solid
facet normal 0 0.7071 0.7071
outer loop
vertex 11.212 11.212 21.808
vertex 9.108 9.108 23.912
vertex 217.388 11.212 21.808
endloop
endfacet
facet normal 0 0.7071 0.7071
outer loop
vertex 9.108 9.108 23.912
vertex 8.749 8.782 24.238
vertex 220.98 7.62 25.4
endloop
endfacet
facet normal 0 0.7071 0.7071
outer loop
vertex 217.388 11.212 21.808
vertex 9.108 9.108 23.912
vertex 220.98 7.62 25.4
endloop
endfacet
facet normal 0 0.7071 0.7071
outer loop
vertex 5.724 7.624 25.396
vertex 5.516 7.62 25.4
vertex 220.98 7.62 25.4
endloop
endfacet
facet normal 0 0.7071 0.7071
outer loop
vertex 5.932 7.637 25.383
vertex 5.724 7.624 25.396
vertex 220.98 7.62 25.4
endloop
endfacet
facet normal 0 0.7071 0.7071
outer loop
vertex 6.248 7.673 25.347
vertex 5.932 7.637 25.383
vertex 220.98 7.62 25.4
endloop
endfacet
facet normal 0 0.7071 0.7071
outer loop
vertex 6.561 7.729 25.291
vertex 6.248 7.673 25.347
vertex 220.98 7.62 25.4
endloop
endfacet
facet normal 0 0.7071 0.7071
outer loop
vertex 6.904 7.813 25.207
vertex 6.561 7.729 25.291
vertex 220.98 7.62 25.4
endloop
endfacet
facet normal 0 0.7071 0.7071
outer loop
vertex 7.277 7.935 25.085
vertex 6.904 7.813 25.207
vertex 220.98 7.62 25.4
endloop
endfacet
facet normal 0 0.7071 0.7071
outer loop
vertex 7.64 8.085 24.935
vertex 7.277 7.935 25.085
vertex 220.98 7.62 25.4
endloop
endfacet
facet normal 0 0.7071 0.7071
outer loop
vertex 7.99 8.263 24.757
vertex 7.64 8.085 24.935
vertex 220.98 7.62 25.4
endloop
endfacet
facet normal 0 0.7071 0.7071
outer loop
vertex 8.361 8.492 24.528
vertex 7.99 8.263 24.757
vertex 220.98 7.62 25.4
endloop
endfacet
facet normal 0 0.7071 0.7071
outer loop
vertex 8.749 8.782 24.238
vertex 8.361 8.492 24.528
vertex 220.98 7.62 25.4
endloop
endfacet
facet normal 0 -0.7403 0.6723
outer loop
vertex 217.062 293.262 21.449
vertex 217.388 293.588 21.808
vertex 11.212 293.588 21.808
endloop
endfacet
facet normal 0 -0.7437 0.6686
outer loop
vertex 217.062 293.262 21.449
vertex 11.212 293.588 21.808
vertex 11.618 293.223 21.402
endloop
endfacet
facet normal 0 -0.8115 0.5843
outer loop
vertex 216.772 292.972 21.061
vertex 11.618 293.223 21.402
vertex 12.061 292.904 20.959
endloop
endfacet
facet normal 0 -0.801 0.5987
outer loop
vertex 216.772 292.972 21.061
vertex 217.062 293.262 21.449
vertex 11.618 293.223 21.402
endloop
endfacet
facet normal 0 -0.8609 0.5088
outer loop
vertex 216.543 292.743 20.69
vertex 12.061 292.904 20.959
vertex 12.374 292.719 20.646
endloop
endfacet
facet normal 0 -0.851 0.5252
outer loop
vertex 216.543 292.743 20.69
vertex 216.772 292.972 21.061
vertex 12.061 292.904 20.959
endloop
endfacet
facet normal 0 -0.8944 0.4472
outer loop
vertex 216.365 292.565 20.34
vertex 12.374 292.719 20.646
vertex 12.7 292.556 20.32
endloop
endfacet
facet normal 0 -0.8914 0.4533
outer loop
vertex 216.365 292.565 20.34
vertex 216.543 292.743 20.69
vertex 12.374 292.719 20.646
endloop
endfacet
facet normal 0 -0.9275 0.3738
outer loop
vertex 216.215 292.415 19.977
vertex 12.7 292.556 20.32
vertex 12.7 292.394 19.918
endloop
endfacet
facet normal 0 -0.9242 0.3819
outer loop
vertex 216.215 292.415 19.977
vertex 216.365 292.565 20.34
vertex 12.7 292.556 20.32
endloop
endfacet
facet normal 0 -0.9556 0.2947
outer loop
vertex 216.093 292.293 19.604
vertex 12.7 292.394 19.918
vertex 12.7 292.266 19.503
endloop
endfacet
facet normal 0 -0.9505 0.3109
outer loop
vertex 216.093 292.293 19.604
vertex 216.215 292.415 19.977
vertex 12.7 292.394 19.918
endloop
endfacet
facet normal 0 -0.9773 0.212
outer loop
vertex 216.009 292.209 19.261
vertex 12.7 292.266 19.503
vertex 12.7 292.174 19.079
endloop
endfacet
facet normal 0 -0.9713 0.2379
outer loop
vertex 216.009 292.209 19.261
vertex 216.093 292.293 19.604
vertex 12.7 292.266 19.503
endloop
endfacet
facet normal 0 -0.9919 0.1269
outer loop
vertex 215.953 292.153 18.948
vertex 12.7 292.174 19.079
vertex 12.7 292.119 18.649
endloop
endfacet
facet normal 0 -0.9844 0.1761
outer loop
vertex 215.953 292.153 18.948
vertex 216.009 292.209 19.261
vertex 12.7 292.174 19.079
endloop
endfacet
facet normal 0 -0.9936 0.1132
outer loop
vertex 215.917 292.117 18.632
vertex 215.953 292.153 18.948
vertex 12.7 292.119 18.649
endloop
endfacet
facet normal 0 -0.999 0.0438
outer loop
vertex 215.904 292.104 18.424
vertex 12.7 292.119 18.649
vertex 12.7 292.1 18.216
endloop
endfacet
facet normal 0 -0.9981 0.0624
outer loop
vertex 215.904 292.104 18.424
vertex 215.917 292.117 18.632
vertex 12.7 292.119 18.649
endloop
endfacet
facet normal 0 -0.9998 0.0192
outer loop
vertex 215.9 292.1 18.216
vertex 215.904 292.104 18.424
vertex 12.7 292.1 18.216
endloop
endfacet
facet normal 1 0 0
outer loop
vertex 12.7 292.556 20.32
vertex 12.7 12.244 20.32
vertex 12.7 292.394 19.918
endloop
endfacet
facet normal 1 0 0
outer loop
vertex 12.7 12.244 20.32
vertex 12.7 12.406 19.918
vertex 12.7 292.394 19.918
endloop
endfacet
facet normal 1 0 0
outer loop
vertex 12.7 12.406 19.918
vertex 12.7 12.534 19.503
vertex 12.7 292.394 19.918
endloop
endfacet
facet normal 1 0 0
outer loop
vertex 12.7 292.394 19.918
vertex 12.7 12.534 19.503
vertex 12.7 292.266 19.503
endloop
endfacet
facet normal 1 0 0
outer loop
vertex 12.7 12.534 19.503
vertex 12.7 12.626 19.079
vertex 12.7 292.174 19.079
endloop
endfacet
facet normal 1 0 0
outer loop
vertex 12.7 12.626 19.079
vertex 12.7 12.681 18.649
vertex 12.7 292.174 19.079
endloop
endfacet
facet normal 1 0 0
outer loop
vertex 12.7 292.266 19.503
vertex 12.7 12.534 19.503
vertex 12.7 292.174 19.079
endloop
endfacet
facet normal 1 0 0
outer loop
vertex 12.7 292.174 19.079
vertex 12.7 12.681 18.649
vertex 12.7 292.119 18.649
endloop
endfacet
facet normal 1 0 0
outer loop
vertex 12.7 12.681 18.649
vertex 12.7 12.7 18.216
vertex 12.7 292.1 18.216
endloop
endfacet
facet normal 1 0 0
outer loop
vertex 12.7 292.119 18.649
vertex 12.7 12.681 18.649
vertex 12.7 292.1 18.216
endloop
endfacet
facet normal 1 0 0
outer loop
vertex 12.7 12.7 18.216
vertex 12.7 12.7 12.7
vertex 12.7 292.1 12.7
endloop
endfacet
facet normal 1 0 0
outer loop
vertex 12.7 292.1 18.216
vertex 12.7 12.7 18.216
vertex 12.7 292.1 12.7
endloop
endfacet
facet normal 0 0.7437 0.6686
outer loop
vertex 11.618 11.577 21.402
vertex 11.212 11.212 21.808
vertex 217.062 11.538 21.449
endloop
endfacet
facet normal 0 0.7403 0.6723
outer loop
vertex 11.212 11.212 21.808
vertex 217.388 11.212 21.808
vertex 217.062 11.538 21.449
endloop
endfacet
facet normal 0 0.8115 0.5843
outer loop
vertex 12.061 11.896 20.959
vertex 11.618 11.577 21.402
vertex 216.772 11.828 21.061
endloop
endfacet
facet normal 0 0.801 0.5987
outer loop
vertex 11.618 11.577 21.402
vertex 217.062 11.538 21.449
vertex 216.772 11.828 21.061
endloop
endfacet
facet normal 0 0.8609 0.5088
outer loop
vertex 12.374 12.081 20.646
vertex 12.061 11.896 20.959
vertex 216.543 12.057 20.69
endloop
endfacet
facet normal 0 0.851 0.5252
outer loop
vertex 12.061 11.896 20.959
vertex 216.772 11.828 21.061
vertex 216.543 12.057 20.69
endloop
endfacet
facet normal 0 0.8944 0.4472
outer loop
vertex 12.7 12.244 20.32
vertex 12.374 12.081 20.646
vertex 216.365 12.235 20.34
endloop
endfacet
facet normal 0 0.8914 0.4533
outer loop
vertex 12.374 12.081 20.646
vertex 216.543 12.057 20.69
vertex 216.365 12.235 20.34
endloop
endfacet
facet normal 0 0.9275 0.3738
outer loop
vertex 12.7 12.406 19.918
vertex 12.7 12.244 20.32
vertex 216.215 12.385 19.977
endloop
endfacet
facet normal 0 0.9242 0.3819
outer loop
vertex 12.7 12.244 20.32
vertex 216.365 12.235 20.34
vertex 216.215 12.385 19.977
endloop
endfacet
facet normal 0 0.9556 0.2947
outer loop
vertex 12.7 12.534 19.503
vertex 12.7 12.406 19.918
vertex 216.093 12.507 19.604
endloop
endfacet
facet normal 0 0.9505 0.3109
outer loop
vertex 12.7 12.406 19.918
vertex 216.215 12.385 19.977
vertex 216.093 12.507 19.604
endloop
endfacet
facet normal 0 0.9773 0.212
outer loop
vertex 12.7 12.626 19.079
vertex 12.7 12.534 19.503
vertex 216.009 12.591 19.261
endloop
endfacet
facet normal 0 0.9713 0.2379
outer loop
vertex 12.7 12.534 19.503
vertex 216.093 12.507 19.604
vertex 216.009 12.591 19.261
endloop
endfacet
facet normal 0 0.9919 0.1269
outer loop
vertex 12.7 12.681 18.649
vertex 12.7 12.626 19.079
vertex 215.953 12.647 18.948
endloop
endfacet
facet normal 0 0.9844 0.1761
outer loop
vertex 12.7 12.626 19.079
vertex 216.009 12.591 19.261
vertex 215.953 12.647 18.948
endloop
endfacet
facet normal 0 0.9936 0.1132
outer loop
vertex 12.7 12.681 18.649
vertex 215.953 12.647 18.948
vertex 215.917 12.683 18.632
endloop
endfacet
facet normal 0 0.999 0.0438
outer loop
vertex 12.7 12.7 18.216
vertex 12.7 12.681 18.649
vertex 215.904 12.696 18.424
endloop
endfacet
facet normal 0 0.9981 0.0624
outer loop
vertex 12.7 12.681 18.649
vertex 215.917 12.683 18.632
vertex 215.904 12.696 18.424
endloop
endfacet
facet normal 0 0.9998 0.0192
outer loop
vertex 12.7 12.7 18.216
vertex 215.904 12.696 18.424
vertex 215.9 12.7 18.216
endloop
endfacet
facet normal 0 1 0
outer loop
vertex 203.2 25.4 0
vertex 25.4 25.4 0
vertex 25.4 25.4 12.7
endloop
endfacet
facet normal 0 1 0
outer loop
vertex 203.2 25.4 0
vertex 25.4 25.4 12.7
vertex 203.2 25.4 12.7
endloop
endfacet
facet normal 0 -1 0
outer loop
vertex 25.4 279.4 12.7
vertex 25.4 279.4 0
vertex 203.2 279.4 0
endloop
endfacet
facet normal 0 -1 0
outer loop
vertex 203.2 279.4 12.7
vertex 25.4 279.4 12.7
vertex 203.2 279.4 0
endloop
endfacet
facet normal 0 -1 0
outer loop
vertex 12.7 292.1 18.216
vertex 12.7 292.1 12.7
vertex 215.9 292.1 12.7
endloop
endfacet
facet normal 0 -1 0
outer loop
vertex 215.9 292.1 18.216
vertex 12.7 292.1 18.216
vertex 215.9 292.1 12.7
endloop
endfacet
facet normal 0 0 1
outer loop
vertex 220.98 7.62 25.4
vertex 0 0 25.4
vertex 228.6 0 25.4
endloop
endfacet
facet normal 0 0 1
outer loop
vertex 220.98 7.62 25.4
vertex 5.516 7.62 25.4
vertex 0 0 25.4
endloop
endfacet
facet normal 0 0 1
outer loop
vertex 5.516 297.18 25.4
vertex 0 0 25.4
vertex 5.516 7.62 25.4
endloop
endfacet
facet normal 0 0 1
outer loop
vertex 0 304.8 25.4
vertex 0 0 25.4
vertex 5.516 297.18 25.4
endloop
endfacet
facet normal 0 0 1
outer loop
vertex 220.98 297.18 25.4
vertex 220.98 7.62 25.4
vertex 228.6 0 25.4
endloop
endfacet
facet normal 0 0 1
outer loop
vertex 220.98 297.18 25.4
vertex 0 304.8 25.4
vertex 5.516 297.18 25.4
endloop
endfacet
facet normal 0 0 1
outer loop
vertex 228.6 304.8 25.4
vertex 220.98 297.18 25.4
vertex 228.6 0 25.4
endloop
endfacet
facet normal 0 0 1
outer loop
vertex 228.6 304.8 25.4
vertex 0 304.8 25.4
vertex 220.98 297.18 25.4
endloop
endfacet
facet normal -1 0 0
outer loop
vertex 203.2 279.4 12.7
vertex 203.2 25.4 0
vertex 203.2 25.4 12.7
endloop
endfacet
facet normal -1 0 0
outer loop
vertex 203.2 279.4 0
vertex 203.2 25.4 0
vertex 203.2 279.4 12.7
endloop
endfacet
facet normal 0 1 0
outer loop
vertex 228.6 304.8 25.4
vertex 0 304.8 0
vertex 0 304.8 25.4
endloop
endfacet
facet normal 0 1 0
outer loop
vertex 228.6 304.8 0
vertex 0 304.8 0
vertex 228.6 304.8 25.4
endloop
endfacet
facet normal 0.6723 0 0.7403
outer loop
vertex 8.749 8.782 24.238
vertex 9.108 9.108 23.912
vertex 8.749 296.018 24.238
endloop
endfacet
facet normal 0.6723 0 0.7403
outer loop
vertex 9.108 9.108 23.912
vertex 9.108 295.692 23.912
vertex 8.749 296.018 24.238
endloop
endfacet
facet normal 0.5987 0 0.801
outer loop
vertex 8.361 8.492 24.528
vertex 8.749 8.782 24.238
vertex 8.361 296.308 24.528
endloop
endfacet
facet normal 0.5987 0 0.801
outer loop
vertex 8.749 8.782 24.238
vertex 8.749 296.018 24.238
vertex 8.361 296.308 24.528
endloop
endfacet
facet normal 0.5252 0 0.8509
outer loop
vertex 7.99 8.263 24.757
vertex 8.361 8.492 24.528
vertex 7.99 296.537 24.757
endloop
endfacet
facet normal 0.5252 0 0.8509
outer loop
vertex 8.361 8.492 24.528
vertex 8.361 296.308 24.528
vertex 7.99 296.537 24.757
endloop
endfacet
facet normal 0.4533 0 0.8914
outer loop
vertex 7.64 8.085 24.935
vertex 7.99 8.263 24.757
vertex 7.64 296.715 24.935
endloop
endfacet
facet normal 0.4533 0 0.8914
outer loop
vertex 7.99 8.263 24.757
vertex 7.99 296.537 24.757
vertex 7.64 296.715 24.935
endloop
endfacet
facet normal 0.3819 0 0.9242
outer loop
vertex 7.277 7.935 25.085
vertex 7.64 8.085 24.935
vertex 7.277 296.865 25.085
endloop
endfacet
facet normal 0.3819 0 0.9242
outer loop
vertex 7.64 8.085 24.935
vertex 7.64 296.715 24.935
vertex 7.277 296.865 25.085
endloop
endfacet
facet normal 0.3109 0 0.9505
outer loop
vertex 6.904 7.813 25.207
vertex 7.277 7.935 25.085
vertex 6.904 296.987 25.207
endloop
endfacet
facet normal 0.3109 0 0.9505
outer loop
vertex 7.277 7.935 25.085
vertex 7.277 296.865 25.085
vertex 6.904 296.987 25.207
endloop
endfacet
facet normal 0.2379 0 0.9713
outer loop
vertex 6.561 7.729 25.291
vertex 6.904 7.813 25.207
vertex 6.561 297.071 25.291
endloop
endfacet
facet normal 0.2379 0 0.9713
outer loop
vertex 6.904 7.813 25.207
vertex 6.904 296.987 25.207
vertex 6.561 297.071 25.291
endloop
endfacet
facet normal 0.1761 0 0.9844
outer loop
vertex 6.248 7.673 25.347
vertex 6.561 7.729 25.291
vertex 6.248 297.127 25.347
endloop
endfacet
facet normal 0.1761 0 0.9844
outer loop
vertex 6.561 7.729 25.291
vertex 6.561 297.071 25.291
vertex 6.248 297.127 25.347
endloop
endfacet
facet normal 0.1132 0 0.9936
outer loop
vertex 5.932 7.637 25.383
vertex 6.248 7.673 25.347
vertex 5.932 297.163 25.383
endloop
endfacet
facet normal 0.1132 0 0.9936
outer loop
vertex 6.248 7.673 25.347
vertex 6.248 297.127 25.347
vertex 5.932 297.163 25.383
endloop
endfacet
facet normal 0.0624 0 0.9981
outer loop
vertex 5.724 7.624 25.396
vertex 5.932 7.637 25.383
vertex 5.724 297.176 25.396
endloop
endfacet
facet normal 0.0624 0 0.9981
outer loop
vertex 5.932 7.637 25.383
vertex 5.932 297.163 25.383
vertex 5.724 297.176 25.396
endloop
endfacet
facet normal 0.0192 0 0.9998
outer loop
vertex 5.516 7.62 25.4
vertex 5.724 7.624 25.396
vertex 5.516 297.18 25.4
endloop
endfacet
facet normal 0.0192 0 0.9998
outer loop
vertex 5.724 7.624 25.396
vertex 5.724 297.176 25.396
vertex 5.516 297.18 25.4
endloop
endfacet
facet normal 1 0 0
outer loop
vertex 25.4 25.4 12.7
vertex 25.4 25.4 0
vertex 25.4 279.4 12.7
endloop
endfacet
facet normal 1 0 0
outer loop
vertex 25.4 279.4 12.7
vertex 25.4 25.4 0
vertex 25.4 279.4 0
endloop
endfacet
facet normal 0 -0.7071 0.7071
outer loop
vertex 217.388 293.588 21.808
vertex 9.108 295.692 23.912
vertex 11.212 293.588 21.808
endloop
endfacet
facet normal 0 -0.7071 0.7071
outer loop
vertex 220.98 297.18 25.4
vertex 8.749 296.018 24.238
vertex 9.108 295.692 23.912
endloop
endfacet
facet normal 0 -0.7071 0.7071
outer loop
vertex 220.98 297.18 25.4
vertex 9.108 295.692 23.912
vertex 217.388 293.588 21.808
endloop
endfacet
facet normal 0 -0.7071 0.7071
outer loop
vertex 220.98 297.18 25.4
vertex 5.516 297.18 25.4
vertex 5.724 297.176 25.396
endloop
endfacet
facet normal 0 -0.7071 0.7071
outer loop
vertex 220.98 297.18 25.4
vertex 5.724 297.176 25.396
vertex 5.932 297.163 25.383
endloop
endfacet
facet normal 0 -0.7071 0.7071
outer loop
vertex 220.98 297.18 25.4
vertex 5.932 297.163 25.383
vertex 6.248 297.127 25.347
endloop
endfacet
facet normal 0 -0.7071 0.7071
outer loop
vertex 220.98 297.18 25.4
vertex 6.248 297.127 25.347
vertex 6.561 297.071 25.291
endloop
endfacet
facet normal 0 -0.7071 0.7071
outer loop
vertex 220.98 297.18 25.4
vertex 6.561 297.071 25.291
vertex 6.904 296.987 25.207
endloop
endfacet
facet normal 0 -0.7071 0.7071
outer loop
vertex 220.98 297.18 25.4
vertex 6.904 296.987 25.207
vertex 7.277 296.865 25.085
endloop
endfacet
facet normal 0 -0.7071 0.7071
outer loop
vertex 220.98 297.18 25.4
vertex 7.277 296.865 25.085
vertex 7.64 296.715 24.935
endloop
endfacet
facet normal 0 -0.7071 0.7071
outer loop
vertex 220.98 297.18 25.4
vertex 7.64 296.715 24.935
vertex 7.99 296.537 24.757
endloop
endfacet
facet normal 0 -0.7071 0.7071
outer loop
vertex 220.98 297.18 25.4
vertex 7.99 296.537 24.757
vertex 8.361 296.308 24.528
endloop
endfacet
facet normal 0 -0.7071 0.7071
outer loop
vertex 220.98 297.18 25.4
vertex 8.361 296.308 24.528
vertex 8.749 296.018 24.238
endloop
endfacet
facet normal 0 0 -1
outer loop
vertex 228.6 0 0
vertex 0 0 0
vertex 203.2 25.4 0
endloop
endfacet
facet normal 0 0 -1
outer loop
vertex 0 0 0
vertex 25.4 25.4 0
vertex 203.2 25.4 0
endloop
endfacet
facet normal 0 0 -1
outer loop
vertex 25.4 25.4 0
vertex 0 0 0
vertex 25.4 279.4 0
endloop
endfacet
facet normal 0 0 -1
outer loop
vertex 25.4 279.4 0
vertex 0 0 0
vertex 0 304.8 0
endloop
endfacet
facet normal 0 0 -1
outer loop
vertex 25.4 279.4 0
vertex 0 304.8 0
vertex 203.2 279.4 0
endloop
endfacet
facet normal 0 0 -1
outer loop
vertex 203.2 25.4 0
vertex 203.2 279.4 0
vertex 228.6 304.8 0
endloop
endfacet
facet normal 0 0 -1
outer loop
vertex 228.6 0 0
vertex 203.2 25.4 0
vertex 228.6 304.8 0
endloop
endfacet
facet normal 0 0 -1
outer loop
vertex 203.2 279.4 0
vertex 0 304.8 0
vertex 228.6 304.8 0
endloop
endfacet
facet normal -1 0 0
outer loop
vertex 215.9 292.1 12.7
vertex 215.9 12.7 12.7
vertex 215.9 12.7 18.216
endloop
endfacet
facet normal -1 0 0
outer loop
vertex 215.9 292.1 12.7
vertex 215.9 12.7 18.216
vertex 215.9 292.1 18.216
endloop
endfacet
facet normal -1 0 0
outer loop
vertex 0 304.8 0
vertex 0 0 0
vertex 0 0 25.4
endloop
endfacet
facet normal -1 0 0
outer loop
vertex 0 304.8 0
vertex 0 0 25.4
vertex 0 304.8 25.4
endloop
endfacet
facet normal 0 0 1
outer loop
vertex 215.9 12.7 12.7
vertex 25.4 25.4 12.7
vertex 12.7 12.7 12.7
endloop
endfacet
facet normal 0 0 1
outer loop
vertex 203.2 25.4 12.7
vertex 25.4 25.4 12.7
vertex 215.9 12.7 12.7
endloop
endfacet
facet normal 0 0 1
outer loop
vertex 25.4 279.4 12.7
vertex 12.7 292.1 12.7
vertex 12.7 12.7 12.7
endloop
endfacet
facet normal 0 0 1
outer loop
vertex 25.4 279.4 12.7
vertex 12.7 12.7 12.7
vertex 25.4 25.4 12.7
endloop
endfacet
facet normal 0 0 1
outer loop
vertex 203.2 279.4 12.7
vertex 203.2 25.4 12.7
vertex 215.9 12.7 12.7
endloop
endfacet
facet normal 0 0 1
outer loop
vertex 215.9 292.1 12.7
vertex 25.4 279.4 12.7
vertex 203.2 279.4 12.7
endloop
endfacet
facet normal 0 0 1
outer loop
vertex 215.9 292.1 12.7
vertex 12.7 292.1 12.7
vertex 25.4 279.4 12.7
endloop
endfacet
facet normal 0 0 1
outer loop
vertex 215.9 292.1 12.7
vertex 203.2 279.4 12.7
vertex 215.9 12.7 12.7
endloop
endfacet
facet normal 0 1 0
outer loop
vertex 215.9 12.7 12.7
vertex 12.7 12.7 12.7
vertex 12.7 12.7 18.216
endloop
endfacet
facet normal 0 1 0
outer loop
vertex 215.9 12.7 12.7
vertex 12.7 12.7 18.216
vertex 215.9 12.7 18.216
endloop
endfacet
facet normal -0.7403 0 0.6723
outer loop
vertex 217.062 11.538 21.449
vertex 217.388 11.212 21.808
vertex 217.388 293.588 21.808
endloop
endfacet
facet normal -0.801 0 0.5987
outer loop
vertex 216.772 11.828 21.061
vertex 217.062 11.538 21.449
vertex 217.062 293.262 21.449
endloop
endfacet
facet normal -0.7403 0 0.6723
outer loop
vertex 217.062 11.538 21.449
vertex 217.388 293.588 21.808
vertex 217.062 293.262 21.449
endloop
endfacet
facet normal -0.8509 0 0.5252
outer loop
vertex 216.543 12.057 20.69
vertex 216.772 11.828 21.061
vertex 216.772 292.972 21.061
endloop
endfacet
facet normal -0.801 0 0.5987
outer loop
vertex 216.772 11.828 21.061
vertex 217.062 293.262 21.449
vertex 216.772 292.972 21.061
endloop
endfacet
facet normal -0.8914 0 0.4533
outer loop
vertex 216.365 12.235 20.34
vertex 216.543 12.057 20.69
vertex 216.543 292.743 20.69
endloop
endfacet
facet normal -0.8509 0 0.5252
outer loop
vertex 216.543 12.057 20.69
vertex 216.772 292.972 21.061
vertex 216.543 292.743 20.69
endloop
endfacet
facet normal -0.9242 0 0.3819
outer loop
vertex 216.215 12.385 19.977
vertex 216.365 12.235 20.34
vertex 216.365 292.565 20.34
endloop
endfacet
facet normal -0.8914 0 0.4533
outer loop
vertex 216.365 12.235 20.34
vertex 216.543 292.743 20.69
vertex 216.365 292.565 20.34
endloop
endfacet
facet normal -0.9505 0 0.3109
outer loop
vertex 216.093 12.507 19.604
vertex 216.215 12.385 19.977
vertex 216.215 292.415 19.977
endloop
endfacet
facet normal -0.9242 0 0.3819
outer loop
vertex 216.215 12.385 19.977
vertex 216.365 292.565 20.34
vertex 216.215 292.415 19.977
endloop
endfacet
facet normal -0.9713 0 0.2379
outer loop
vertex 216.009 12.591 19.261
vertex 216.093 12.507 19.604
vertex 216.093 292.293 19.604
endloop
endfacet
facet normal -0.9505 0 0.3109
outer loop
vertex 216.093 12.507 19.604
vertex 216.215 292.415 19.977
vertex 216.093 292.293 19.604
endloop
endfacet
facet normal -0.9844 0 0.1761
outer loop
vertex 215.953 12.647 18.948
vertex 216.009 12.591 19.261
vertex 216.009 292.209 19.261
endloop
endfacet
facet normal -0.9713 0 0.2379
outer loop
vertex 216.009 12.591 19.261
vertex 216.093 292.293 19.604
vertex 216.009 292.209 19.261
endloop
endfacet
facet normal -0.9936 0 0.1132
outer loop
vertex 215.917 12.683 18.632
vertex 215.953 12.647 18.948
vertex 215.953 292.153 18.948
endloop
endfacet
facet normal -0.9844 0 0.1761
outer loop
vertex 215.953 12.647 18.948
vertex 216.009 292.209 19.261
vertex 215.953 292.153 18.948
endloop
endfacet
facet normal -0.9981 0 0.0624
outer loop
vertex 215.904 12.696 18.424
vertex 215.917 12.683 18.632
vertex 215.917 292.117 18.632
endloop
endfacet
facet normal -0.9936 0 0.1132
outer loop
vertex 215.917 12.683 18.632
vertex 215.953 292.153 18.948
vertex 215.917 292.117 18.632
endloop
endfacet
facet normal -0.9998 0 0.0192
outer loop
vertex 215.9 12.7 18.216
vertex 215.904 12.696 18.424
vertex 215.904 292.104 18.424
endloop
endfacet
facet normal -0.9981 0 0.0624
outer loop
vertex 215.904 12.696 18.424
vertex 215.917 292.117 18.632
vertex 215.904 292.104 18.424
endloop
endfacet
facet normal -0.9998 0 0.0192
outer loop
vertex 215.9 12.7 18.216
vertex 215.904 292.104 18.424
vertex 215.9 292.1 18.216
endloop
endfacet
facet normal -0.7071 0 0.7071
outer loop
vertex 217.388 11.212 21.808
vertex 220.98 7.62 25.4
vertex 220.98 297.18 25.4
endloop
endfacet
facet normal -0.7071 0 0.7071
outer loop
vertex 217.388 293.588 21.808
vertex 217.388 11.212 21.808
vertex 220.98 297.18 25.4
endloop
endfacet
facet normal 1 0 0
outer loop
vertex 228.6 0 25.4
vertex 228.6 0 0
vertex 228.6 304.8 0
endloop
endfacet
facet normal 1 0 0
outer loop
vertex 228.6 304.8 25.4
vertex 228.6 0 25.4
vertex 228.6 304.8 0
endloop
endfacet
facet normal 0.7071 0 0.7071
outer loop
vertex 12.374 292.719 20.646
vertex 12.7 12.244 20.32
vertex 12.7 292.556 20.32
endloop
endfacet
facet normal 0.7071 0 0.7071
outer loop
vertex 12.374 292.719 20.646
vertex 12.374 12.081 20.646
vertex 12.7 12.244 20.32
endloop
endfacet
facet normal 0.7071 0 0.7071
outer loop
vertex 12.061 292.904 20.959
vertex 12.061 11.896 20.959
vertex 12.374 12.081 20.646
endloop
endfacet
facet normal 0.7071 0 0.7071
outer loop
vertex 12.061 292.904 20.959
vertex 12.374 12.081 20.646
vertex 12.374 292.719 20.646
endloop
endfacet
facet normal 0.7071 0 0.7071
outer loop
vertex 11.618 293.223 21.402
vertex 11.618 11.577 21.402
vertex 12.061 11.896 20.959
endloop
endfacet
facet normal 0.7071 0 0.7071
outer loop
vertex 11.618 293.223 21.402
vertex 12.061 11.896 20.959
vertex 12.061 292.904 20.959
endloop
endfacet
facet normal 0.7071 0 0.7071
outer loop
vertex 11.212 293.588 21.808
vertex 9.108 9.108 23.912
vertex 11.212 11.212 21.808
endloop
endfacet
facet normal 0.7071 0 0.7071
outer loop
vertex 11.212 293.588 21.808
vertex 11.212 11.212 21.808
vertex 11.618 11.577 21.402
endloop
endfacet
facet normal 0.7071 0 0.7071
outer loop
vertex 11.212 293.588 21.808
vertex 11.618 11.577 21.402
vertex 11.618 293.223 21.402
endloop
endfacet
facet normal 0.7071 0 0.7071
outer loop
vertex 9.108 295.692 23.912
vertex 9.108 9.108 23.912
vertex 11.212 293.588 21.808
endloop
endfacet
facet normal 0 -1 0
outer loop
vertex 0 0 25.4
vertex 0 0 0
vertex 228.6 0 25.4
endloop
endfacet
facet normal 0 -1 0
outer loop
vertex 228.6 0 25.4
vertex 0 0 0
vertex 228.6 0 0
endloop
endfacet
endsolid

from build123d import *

# Parameters (mm, degrees)
F0_W     = 228.6
F0_H     = 304.8
F0_W_2   = 203.2
F0_H_2   = 279.4
F1_DEPTH = 25.4
F0_W_3   = 177.8
F0_H_3   = 254
F2_DEPTH = 12.7
F3_SIZE  = 5.08
F4_F1_R  = 5.08
F4_F2_R  = 5.08
F4_F3_R  = 5.08
F4_F4_R  = 5.08


with BuildPart() as f1:
    # F0 (on Top) → F1 (new body)
    with BuildSketch(Plane.XY):
        with Locations((114.3, 152.4)):
            Rectangle(F0_W, F0_H)
        with Locations((114.3, 152.4)):
            Rectangle(F0_W_2, F0_H_2, mode=Mode.SUBTRACT)
    extrude(amount=F1_DEPTH)

    # F0 (on Top) → F2 (join)
    with BuildSketch(Plane.XY):
        with Locations((114.3, 152.4)):
            Rectangle(F0_W_2, F0_H_2)
        with Locations((114.3, 152.4)):
            Rectangle(F0_W_3, F0_H_3, mode=Mode.SUBTRACT)
    extrude(amount=F2_DEPTH)

    # F3
    f3_edges = [f1.edges().sort_by_distance(p)[0] for p in [
        (114.3, 292.1, 25.4),
        (215.9, 152.4, 25.4),
        (12.7, 152.4, 25.4),
        (114.3, 12.7, 25.4),
    ]]
    chamfer(f3_edges, length=F3_SIZE)

    # F4: fillet of radius 5.08 on 4 edges, made by hand

    # F4_f1
    f4_f1_edges = [f1.edges().sort_by_distance(p)[0] for p in [
        (7.62, 152.4, 25.4),
    ]]
    fillet(f4_f1_edges, radius=F4_F1_R)

    # F4_f2
    f4_f2_edges = [f1.edges().sort_by_distance(p)[0] for p in [
        (114.3, 292.1, 20.32),
    ]]
    fillet(f4_f2_edges, radius=F4_F2_R)

    # F4_f3
    f4_f3_edges = [f1.edges().sort_by_distance(p)[0] for p in [
        (215.9, 152.6281435083, 20.32),
    ]]
    fillet(f4_f3_edges, radius=F4_F3_R)

    # F4_f4
    f4_f4_edges = [f1.edges().sort_by_distance(p)[0] for p in [
        (114.5281435083, 12.7, 20.32),
    ]]
    fillet(f4_f4_edges, radius=F4_F4_R)


solid = f1.part
